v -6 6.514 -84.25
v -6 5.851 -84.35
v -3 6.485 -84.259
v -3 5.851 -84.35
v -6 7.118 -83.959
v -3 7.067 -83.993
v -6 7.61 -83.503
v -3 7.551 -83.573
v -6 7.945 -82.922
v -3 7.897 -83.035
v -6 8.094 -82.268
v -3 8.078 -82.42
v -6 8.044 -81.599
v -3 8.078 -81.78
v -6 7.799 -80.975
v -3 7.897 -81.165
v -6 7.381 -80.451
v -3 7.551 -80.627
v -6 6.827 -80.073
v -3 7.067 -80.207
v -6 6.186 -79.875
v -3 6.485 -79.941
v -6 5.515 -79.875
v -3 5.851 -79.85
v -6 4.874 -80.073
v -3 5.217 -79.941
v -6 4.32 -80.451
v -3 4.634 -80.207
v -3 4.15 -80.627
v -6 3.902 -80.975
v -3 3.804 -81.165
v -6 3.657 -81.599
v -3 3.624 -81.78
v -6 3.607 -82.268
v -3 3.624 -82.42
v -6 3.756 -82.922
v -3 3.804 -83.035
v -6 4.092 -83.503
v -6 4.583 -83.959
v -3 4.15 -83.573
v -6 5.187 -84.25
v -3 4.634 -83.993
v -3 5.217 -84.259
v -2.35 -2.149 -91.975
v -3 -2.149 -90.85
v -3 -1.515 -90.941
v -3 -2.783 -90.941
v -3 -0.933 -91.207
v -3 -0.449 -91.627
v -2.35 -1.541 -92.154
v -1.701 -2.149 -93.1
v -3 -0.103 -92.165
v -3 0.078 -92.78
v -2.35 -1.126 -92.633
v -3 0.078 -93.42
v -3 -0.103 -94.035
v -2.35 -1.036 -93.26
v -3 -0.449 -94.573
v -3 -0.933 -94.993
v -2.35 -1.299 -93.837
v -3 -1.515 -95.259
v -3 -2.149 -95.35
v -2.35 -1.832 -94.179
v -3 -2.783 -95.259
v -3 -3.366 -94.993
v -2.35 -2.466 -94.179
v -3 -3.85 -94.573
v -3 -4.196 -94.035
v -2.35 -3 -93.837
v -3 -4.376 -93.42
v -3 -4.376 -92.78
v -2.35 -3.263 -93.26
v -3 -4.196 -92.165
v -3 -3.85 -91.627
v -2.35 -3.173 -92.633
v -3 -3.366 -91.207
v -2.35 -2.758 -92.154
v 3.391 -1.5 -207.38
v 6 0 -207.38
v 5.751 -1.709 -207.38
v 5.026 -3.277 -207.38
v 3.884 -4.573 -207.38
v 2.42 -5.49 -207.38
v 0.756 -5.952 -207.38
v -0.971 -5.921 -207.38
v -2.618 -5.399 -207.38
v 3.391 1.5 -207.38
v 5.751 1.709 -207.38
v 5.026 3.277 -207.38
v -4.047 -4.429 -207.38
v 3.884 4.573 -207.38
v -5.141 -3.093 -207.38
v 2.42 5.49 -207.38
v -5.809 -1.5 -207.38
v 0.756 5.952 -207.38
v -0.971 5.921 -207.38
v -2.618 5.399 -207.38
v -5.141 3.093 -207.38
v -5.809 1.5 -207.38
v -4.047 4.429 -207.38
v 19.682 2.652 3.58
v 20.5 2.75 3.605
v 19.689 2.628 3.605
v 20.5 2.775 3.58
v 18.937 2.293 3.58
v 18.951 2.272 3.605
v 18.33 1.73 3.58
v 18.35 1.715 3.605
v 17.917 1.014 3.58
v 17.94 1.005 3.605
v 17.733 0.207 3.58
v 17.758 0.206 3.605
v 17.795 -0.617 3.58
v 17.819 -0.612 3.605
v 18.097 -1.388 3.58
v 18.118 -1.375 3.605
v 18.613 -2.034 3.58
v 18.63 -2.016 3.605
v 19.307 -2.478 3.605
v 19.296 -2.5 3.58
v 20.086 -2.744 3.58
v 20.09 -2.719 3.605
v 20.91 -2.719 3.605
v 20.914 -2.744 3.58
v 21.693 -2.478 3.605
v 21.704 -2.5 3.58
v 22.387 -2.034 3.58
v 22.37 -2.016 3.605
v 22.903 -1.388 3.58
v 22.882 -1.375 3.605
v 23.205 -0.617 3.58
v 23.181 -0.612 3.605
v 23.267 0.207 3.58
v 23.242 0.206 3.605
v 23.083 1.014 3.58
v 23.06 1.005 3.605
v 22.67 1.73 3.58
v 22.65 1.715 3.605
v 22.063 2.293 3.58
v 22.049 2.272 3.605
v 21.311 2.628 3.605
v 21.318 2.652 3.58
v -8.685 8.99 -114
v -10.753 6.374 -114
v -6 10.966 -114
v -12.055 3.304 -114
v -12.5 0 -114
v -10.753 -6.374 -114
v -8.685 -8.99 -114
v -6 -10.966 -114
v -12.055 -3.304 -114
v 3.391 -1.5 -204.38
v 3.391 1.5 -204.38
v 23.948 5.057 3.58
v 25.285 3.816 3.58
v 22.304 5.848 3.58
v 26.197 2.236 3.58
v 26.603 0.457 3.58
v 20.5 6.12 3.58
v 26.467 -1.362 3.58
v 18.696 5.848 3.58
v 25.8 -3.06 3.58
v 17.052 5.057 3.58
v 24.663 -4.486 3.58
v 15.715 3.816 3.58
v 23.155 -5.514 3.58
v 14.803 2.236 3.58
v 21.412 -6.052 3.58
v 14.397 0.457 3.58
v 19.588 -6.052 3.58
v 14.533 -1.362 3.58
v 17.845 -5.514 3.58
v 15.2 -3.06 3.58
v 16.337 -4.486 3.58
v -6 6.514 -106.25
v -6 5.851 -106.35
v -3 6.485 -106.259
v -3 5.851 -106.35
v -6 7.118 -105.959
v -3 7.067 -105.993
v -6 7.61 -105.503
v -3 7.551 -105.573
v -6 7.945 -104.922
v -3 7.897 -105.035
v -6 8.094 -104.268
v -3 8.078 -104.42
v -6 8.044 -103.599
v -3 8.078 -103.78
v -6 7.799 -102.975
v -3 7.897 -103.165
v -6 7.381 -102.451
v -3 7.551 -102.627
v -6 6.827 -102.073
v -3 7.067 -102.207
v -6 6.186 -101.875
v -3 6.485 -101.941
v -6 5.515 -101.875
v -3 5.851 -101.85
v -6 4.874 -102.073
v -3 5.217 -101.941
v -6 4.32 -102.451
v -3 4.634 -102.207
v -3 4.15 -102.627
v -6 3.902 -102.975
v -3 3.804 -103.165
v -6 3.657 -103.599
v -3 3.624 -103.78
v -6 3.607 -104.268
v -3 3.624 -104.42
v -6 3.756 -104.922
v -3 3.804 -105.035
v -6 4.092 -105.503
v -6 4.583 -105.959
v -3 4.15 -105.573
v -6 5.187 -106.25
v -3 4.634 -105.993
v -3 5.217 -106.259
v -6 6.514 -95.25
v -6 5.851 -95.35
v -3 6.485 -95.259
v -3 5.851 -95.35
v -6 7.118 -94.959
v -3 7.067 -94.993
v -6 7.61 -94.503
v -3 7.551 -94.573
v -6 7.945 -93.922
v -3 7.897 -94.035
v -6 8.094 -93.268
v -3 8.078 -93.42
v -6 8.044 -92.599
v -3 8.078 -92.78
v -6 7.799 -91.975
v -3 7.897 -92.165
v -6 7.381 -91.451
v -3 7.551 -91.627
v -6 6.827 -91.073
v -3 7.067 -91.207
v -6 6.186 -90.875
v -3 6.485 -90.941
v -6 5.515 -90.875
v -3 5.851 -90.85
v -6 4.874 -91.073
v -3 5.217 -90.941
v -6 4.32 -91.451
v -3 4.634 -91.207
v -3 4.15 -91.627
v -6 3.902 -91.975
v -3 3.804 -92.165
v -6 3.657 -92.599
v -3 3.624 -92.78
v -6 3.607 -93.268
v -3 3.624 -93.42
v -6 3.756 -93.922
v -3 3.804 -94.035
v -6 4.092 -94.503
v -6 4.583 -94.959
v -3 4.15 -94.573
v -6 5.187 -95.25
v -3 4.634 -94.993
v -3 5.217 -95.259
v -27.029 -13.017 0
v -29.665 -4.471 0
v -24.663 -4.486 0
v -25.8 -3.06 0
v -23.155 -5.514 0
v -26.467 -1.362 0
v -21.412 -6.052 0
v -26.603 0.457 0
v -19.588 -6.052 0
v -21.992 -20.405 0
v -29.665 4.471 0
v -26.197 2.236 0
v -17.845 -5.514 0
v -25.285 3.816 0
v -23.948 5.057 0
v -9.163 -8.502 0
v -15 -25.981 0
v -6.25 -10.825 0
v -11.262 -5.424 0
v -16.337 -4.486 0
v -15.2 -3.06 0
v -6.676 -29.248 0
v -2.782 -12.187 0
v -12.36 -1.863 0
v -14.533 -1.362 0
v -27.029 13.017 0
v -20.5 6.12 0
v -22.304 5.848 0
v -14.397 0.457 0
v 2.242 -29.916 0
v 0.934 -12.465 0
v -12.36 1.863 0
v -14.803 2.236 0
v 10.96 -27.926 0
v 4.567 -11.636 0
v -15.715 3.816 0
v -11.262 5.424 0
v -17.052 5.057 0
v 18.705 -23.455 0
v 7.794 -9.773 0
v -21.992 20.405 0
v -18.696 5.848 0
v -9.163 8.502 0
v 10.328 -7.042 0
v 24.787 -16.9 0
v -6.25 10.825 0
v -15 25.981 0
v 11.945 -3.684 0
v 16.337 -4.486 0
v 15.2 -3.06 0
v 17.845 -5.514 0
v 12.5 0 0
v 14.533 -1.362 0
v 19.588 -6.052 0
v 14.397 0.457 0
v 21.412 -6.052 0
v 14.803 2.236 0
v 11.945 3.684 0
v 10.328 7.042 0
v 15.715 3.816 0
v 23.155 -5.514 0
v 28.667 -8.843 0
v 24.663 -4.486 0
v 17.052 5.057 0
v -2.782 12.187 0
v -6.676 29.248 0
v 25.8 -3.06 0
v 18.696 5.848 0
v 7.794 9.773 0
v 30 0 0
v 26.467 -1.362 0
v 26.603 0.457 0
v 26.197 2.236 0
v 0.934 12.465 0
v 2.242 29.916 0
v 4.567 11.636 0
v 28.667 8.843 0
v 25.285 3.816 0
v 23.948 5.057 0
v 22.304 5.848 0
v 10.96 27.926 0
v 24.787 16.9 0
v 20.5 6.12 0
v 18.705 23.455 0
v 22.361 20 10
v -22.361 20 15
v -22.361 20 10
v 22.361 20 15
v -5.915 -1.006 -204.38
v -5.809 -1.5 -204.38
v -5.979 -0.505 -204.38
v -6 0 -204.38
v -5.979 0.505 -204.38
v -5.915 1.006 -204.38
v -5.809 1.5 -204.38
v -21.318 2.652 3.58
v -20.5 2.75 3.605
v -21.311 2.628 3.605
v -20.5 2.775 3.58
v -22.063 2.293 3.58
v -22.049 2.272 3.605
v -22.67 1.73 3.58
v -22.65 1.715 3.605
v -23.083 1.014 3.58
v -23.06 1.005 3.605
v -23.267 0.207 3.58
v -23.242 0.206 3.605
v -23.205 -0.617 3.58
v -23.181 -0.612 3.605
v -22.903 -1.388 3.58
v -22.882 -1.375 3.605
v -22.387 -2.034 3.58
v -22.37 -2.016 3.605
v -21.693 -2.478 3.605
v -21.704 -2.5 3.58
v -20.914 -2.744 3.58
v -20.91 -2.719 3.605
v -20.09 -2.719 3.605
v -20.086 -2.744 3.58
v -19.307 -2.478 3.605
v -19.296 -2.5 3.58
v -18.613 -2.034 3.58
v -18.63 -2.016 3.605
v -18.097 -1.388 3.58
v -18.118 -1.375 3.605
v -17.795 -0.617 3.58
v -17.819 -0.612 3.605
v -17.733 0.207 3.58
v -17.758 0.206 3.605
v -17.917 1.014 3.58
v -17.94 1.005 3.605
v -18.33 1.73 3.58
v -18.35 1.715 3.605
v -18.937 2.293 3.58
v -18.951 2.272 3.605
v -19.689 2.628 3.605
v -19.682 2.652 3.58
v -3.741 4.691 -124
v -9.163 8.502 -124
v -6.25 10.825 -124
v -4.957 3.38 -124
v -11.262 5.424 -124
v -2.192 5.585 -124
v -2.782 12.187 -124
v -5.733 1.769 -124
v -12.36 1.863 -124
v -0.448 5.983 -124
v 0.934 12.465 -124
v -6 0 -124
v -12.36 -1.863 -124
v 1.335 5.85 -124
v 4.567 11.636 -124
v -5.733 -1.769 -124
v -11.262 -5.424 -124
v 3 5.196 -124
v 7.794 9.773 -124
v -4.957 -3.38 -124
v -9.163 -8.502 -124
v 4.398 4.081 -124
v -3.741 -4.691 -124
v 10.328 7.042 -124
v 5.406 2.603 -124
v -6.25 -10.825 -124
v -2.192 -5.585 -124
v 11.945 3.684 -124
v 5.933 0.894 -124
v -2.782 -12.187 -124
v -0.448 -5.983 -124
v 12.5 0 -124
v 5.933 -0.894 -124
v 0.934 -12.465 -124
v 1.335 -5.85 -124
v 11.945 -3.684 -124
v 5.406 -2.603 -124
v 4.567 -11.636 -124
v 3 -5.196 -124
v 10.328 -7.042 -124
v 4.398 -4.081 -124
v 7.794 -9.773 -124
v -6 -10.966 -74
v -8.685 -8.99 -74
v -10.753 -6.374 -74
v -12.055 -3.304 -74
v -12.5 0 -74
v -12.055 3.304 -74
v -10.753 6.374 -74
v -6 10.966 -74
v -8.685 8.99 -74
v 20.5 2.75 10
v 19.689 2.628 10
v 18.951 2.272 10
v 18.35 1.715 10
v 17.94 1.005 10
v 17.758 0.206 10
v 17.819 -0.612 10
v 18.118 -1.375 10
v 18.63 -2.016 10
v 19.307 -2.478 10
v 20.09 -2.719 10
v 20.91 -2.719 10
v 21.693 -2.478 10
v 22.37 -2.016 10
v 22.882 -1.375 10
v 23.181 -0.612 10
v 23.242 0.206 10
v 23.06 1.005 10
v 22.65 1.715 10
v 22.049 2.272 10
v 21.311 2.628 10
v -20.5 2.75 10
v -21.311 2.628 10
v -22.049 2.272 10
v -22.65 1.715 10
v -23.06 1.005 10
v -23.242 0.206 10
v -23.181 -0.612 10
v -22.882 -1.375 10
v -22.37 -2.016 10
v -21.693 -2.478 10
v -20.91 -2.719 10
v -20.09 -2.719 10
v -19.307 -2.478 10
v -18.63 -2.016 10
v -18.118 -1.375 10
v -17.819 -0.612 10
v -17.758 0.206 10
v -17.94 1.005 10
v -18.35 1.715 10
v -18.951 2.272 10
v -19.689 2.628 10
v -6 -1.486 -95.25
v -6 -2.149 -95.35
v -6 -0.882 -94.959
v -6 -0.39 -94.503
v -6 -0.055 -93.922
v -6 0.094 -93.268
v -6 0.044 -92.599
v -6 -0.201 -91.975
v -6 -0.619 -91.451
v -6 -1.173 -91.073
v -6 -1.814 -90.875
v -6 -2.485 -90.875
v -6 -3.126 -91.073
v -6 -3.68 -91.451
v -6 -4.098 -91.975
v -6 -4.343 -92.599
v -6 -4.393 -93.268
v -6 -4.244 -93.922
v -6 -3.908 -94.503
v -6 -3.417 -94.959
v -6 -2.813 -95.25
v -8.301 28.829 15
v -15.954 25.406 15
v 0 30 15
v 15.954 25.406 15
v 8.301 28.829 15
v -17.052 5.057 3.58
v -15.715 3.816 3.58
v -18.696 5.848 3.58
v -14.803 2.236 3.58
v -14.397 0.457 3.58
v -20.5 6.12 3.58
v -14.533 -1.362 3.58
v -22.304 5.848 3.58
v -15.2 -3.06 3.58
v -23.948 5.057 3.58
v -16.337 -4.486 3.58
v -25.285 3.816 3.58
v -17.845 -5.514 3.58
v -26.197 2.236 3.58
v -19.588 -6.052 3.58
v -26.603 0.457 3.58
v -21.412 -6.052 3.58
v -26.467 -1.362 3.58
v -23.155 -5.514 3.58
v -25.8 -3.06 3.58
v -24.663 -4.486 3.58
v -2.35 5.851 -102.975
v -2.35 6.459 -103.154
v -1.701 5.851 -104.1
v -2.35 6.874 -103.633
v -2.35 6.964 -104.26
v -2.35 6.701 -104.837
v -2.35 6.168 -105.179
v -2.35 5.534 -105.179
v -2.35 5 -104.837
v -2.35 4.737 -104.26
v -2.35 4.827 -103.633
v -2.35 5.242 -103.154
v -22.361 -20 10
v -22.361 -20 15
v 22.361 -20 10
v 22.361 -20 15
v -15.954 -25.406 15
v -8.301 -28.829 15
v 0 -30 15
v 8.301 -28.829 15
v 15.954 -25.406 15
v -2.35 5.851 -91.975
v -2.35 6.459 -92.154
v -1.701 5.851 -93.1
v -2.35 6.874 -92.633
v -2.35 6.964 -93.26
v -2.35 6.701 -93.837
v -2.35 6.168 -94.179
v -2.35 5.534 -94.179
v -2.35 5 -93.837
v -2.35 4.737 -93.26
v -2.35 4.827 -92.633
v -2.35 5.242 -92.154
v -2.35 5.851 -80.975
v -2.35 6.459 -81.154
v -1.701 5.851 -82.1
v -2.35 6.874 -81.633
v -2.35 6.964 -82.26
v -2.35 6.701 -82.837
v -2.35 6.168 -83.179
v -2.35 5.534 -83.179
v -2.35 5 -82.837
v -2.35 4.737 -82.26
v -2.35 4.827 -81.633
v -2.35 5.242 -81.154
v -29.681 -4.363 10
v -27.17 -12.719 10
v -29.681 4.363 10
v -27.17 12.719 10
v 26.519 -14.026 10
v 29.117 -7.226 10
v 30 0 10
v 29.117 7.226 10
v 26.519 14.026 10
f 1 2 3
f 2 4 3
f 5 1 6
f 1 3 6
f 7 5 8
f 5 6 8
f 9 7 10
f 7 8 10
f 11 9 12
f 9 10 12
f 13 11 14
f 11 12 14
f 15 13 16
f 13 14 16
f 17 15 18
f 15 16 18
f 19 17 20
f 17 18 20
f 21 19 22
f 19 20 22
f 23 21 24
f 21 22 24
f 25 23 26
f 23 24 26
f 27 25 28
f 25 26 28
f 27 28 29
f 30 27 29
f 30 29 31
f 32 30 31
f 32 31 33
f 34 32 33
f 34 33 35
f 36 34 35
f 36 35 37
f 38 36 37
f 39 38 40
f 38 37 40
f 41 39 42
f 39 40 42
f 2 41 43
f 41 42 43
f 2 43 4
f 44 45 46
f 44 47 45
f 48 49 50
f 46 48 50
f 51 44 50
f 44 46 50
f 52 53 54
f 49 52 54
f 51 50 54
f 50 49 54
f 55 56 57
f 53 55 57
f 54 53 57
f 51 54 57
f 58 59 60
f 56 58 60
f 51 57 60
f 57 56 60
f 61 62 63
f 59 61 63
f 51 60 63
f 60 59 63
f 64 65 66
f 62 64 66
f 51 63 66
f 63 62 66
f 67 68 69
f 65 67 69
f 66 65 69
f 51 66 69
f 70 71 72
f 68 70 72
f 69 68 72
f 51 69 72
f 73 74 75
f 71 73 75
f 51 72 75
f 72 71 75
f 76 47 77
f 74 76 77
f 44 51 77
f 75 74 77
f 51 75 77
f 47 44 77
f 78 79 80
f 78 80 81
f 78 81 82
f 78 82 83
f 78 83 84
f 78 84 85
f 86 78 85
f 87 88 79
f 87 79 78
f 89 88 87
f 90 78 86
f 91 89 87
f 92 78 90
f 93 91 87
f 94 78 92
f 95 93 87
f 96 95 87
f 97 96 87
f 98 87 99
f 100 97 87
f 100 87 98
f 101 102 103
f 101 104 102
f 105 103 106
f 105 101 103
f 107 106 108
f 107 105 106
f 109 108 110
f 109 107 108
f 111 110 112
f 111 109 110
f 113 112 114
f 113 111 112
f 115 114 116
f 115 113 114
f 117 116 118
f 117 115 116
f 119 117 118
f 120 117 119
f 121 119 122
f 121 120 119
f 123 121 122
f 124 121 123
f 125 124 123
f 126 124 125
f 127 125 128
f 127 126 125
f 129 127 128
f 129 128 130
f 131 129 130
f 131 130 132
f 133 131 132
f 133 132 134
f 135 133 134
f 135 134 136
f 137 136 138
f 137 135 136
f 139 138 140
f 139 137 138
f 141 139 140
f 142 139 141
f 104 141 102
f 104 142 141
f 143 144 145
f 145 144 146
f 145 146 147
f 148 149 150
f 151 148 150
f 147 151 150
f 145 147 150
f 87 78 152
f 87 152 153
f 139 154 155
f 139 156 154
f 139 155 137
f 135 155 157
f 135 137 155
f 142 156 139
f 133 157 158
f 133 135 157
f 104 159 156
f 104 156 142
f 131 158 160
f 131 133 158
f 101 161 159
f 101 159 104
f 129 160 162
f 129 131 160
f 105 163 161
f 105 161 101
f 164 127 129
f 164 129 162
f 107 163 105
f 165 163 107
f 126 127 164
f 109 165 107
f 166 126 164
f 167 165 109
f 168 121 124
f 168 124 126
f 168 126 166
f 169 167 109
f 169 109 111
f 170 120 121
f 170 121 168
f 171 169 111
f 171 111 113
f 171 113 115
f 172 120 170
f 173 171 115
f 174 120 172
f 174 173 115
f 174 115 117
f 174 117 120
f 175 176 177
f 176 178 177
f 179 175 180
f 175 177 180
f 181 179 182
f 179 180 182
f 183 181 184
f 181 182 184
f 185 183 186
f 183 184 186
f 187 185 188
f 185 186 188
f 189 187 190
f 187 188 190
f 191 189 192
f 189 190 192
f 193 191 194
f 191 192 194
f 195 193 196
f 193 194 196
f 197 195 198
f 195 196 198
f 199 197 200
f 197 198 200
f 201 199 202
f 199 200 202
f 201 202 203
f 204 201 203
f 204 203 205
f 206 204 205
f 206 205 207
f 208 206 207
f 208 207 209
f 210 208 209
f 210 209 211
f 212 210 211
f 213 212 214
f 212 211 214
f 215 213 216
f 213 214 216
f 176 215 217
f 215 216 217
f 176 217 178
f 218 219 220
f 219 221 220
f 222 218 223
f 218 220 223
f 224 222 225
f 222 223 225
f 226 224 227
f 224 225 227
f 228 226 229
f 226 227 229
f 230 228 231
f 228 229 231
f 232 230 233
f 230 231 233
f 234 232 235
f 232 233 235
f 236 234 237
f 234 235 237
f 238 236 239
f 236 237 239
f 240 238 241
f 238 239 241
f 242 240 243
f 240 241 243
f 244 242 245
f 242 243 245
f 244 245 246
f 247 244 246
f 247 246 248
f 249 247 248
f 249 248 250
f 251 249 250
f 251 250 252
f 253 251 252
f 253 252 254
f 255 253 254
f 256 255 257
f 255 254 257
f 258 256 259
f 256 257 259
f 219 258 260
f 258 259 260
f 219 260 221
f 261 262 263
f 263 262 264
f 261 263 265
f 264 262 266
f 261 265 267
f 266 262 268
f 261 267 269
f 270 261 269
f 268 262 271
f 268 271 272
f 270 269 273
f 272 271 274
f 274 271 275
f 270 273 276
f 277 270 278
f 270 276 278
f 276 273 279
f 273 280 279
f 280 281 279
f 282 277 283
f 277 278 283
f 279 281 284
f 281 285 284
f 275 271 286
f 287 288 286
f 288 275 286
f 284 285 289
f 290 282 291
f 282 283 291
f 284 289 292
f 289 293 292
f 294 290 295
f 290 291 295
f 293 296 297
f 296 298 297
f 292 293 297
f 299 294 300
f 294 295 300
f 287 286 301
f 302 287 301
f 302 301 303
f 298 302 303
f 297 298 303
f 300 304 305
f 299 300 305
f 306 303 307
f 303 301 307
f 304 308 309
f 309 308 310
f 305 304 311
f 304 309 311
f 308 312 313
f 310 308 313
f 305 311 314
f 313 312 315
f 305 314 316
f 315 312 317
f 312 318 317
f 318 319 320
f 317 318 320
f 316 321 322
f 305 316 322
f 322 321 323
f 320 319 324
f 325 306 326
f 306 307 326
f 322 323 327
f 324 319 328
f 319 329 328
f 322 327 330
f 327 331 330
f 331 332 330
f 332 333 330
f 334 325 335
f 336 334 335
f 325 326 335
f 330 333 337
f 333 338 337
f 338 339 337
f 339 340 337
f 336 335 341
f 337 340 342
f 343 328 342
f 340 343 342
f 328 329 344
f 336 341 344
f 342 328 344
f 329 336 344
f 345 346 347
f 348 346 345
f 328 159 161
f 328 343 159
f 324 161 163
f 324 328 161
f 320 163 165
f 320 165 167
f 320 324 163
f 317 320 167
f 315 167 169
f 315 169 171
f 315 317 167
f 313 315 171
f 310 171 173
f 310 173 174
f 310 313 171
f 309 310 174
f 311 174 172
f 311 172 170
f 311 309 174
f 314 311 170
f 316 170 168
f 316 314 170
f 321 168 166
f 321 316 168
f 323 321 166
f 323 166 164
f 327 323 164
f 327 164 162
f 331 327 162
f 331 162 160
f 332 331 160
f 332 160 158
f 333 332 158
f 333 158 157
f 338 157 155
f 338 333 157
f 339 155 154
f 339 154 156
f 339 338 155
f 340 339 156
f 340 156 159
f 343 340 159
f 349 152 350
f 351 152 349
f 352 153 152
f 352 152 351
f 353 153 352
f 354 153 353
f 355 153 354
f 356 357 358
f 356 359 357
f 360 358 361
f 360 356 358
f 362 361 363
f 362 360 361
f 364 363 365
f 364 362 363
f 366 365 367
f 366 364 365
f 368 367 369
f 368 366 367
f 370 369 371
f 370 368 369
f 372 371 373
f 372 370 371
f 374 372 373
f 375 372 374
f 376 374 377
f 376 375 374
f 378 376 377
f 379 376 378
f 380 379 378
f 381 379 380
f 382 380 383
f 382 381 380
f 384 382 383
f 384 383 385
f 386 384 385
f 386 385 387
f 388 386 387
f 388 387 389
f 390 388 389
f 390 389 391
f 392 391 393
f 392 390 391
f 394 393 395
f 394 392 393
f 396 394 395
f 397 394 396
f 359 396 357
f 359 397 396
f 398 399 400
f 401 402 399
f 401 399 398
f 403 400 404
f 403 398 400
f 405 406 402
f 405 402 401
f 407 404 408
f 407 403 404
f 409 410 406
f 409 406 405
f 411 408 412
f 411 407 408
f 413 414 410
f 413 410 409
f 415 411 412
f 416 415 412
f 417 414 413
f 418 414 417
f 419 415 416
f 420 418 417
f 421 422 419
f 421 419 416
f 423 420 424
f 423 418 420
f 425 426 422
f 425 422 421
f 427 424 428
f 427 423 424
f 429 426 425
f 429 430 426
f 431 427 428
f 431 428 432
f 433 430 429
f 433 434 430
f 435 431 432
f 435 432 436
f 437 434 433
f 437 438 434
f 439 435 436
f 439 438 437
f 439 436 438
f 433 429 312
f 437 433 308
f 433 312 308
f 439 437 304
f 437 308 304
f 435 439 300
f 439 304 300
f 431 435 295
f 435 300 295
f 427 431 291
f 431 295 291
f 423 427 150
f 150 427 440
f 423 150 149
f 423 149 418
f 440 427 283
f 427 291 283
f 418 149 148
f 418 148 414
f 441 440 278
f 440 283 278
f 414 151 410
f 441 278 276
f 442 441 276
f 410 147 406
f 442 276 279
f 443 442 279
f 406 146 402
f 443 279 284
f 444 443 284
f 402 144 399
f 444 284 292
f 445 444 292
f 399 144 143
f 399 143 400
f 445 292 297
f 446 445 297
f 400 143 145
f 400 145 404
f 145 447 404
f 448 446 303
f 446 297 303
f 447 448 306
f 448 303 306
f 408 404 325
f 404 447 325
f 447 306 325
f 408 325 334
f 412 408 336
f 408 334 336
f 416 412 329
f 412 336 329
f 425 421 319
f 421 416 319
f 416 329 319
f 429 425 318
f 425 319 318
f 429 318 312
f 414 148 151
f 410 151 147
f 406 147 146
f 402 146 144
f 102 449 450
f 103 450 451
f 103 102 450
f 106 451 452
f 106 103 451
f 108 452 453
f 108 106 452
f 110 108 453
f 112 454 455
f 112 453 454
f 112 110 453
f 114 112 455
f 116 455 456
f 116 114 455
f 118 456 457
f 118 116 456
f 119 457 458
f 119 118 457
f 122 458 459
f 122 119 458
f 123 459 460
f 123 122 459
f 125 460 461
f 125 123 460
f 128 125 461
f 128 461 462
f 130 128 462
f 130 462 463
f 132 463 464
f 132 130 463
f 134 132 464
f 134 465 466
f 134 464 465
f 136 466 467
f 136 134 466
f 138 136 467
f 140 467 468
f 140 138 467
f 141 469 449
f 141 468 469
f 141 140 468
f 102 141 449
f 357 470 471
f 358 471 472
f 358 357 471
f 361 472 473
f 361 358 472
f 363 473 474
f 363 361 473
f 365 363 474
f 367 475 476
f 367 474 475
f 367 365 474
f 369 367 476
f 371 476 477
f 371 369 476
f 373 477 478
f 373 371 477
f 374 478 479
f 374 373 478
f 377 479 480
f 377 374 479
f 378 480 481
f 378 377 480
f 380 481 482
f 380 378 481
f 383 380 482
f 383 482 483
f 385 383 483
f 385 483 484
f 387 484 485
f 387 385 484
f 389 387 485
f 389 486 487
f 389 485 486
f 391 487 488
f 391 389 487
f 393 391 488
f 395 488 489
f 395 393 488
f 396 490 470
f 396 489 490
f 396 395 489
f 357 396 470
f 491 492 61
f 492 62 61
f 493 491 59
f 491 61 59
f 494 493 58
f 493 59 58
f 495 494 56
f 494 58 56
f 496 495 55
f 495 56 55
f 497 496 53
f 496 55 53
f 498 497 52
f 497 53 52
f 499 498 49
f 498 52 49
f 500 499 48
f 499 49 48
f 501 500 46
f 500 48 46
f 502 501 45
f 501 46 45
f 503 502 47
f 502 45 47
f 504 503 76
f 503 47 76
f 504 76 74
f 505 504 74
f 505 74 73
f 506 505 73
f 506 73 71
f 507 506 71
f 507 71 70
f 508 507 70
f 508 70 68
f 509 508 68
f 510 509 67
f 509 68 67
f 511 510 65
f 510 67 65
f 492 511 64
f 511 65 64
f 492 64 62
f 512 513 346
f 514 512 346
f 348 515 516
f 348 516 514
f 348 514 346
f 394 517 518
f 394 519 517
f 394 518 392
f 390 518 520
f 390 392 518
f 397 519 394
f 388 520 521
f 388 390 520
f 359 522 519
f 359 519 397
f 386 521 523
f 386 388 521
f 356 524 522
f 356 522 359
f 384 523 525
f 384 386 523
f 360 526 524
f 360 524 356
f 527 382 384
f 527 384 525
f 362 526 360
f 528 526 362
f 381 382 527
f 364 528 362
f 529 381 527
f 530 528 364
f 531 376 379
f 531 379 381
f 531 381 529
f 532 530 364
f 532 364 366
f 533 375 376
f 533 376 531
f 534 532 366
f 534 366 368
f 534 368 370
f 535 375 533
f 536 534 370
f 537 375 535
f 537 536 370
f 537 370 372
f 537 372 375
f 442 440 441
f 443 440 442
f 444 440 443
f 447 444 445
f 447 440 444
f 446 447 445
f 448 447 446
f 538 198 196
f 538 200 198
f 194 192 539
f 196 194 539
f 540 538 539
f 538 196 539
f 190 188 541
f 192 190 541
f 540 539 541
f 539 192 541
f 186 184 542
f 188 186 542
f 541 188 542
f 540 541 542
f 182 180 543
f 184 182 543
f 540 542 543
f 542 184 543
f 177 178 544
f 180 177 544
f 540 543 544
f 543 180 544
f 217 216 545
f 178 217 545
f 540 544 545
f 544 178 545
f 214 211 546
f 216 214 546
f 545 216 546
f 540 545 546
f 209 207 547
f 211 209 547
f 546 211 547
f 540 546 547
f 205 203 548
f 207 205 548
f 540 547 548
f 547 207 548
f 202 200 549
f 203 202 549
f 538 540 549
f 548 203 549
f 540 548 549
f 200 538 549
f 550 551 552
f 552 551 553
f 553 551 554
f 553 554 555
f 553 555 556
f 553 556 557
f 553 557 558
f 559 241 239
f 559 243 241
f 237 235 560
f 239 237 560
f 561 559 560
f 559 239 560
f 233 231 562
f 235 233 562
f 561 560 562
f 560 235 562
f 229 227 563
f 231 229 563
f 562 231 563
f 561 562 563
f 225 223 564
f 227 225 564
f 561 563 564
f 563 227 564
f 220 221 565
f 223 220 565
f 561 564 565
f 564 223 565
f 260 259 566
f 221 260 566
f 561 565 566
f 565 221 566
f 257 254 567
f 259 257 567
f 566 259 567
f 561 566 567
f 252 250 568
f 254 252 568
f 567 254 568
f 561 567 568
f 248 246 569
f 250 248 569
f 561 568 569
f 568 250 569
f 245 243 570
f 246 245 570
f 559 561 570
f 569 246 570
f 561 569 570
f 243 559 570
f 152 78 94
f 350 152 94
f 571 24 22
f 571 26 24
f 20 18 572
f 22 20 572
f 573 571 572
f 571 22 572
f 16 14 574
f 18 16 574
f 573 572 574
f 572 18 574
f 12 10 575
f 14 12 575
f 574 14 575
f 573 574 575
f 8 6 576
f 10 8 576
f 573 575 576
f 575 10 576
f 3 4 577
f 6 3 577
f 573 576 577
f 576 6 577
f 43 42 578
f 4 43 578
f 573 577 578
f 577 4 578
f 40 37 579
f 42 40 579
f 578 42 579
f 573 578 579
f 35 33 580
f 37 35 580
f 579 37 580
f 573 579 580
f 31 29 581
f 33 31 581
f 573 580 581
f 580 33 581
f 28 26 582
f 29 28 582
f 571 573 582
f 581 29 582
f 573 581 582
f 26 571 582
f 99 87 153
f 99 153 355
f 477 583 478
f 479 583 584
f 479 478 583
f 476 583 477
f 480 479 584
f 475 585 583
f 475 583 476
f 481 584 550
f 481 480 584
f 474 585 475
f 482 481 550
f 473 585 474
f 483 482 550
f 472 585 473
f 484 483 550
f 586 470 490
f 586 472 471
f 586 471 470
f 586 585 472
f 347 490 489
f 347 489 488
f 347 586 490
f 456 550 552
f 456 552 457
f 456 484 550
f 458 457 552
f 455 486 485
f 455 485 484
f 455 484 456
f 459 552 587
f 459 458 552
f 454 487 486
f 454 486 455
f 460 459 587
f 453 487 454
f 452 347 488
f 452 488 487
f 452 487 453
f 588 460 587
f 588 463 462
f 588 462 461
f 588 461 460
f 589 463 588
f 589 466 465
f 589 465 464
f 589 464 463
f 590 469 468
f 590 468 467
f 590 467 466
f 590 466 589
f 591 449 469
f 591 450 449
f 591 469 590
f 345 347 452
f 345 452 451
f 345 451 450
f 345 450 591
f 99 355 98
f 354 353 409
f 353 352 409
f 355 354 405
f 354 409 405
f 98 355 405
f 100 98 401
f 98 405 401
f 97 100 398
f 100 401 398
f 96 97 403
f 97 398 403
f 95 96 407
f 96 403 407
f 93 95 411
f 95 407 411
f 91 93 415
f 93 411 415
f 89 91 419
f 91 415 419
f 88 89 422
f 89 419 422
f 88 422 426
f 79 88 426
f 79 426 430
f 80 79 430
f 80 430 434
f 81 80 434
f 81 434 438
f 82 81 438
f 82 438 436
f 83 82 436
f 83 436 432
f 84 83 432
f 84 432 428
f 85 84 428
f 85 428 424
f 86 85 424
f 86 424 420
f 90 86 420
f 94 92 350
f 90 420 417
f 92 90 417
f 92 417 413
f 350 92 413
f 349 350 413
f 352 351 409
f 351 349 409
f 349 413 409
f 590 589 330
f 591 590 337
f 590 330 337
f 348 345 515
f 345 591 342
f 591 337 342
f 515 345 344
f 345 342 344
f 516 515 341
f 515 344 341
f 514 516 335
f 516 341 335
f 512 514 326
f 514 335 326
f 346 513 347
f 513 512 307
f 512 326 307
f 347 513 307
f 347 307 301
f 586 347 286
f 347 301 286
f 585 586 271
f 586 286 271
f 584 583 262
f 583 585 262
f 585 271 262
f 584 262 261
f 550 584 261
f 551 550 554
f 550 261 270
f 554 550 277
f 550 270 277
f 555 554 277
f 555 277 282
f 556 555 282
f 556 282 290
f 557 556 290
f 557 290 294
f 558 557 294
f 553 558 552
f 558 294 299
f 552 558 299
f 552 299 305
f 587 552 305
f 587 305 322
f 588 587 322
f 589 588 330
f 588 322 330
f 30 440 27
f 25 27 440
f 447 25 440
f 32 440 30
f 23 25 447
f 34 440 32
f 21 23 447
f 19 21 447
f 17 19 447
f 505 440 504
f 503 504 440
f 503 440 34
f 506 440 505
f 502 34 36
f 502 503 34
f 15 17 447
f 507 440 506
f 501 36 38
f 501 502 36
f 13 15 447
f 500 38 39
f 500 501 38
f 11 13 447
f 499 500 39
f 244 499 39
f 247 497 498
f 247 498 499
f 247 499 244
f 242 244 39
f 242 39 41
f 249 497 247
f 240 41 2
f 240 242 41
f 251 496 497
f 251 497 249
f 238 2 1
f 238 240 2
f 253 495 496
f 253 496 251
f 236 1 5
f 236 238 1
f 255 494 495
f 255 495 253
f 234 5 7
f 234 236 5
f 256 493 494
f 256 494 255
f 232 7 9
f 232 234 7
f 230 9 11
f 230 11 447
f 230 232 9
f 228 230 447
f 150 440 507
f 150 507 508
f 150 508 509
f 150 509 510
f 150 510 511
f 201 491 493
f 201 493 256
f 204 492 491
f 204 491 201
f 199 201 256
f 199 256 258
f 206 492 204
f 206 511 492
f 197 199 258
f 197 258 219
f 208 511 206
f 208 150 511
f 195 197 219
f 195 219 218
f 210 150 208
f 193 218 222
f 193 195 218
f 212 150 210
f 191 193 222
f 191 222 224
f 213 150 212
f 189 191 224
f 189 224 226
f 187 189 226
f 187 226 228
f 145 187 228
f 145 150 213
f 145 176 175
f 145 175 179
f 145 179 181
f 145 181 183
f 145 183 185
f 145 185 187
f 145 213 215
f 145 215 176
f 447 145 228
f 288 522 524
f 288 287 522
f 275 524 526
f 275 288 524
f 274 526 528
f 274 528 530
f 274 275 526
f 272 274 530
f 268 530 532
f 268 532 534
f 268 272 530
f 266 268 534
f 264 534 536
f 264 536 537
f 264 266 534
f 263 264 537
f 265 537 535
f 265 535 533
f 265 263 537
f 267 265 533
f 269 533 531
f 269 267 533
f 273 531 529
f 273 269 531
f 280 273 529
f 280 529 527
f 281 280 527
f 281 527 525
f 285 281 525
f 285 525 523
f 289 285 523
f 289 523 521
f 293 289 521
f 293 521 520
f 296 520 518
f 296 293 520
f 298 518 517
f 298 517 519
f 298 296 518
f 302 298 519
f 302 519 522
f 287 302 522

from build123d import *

# Parameters (mm, degrees)
ESQUISSE1_R                                = 30
BOSS_EXTRU_1_DEPTH                         = 15
ESQUISSE2_R                                = 12.5
BOSS_EXTRU_2_DEPTH                         = 124
ESQUISSE4_2_W                              = 230
ESQUISSE4_2_H                              = 40
ENL_V_MAT_EXTRU_1_DEPTH                    = 5
CHAMBRAGE_POUR_VIS_T_TE_HEXAGONALE_2_COUNT = 2
CHAMBRAGE_POUR_VIS_T_TE_HEXAGONALE_2_PITCH = 41
ESQUISSE17_R                               = 6
BOSS_EXTRU_4_DEPTH                         = 83.38
ESQUISSE18_W                               = 10.356322474
ESQUISSE18_H                               = 3
ENL_V_MAT_EXTRU_2_DEPTH                    = 3
ESQUISSE19_W                               = 7.933443835
ESQUISSE19_H                               = 21.9317122
ENL_V_MAT_EXTRU_3_DEPTH                    = 50
BOSS_EXTRU_6_START                         = -10
ESQUISSE21_R                               = 12.5
BOSS_EXTRU_6_DEPTH                         = 10
D_GAGEMENT_M41_D                           = 4.5
D_GAGEMENT_M41_DEPTH                       = 3
D_GAGEMENT_M41_TIP                         = 1.299038106


with BuildPart() as part:
    # Esquisse1 → Boss.-Extru.1 (new body)
    with BuildSketch(Plane.XY):
        Circle(ESQUISSE1_R)
    extrude(amount=BOSS_EXTRU_1_DEPTH)

    # Esquisse2 → Boss.-Extru.2 (add)
    with BuildSketch(Plane(origin=(0, 0, 0), x_dir=(-1, 0, 0), z_dir=(0, 0, -1))):
        with Locations(Location((0, 0, 0), (0, 0, 180))):
            Circle(ESQUISSE2_R)
    extrude(amount=BOSS_EXTRU_2_DEPTH)

    # Esquisse4<2> → Enlèv. mat.-Extru.1 (cut)
    with BuildSketch(Plane.XY.offset(15)):
        Rectangle(ESQUISSE4_2_W, ESQUISSE4_2_H)
    extrude(amount=-ENL_V_MAT_EXTRU_1_DEPTH, mode=Mode.SUBTRACT)

    # Esquisse14 → Chambrage pour vis à tête hexagonale M51 (revolve, cut)
    with BuildSketch(Plane.YZ.offset(-20.5)):
        Polygon((0, 0), (0, 15), (2.75, 15), (2.75, 3.605), (2.775, 3.58), (6.12, 3.58), (6.12, 0), align=None)
    chambrage_pour_vis_t_te_hexagonale_m51 = revolve(axis=Axis((-20.5, 0, -6.35), (0, 0, 1)), mode=Mode.SUBTRACT)

    # Chambrage pour vis _ t_te hexagonale 2: Chambrage pour vis à tête hexagonale M51 ×2
    with Locations(*[(i * CHAMBRAGE_POUR_VIS_T_TE_HEXAGONALE_2_PITCH, 0, 0) for i in range(1, CHAMBRAGE_POUR_VIS_T_TE_HEXAGONALE_2_COUNT)]):
        add(chambrage_pour_vis_t_te_hexagonale_m51, mode=Mode.SUBTRACT)

    # Esquisse17 → Boss.-Extru.4 (add)
    with BuildSketch(Plane(origin=(0, 0, -124), x_dir=(-1, 0, 0), z_dir=(0, 0, -1))):
        Circle(ESQUISSE17_R)
    extrude(amount=BOSS_EXTRU_4_DEPTH)

    # Esquisse18 → Enlèv. mat.-Extru.2 (cut)
    with BuildSketch(Plane(origin=(0, 0, -207.38), x_dir=(-1, 0, 0), z_dir=(0, 0, -1))):
        with Locations((1.787207702, 0)):
            Rectangle(ESQUISSE18_W, ESQUISSE18_H)
    extrude(amount=-ENL_V_MAT_EXTRU_2_DEPTH, mode=Mode.SUBTRACT)

    # Esquisse19 → Enlèv. mat.-Extru.3 (cut)
    with BuildSketch(Plane(origin=(0, 0, -124), x_dir=(-1, 0, 0), z_dir=(0, 0, -1))):
        with Locations((9.966721917, 0)):
            Rectangle(ESQUISSE19_W, ESQUISSE19_H)
    extrude(amount=-ENL_V_MAT_EXTRU_3_DEPTH, mode=Mode.SUBTRACT)

    # Esquisse21 → Boss.-Extru.6 (add)
    with BuildSketch(Plane(origin=(0, 0, -124), x_dir=(-1, 0, 0), z_dir=(0, 0, -1)).offset(BOSS_EXTRU_6_START)):
        with Locations(Location((0, 0, 0), (0, 0, 180))):
            Circle(ESQUISSE21_R)
    extrude(amount=BOSS_EXTRU_6_DEPTH)

    # Dégagement M41
    with Locations(Plane.ZY.offset(6)):
        with Locations((-82.1, 5.85067254), (-93.1, -2.14932746), (-93.1, 5.85067254), (-104.1, 5.85067254)):
            Hole(D_GAGEMENT_M41_D / 2, depth=D_GAGEMENT_M41_DEPTH)
            with Locations((0, 0, -(D_GAGEMENT_M41_DEPTH + D_GAGEMENT_M41_TIP / 2))):  # 120° drill point
                Cone(0, D_GAGEMENT_M41_D / 2, D_GAGEMENT_M41_TIP, mode=Mode.SUBTRACT)


solid = part.part
